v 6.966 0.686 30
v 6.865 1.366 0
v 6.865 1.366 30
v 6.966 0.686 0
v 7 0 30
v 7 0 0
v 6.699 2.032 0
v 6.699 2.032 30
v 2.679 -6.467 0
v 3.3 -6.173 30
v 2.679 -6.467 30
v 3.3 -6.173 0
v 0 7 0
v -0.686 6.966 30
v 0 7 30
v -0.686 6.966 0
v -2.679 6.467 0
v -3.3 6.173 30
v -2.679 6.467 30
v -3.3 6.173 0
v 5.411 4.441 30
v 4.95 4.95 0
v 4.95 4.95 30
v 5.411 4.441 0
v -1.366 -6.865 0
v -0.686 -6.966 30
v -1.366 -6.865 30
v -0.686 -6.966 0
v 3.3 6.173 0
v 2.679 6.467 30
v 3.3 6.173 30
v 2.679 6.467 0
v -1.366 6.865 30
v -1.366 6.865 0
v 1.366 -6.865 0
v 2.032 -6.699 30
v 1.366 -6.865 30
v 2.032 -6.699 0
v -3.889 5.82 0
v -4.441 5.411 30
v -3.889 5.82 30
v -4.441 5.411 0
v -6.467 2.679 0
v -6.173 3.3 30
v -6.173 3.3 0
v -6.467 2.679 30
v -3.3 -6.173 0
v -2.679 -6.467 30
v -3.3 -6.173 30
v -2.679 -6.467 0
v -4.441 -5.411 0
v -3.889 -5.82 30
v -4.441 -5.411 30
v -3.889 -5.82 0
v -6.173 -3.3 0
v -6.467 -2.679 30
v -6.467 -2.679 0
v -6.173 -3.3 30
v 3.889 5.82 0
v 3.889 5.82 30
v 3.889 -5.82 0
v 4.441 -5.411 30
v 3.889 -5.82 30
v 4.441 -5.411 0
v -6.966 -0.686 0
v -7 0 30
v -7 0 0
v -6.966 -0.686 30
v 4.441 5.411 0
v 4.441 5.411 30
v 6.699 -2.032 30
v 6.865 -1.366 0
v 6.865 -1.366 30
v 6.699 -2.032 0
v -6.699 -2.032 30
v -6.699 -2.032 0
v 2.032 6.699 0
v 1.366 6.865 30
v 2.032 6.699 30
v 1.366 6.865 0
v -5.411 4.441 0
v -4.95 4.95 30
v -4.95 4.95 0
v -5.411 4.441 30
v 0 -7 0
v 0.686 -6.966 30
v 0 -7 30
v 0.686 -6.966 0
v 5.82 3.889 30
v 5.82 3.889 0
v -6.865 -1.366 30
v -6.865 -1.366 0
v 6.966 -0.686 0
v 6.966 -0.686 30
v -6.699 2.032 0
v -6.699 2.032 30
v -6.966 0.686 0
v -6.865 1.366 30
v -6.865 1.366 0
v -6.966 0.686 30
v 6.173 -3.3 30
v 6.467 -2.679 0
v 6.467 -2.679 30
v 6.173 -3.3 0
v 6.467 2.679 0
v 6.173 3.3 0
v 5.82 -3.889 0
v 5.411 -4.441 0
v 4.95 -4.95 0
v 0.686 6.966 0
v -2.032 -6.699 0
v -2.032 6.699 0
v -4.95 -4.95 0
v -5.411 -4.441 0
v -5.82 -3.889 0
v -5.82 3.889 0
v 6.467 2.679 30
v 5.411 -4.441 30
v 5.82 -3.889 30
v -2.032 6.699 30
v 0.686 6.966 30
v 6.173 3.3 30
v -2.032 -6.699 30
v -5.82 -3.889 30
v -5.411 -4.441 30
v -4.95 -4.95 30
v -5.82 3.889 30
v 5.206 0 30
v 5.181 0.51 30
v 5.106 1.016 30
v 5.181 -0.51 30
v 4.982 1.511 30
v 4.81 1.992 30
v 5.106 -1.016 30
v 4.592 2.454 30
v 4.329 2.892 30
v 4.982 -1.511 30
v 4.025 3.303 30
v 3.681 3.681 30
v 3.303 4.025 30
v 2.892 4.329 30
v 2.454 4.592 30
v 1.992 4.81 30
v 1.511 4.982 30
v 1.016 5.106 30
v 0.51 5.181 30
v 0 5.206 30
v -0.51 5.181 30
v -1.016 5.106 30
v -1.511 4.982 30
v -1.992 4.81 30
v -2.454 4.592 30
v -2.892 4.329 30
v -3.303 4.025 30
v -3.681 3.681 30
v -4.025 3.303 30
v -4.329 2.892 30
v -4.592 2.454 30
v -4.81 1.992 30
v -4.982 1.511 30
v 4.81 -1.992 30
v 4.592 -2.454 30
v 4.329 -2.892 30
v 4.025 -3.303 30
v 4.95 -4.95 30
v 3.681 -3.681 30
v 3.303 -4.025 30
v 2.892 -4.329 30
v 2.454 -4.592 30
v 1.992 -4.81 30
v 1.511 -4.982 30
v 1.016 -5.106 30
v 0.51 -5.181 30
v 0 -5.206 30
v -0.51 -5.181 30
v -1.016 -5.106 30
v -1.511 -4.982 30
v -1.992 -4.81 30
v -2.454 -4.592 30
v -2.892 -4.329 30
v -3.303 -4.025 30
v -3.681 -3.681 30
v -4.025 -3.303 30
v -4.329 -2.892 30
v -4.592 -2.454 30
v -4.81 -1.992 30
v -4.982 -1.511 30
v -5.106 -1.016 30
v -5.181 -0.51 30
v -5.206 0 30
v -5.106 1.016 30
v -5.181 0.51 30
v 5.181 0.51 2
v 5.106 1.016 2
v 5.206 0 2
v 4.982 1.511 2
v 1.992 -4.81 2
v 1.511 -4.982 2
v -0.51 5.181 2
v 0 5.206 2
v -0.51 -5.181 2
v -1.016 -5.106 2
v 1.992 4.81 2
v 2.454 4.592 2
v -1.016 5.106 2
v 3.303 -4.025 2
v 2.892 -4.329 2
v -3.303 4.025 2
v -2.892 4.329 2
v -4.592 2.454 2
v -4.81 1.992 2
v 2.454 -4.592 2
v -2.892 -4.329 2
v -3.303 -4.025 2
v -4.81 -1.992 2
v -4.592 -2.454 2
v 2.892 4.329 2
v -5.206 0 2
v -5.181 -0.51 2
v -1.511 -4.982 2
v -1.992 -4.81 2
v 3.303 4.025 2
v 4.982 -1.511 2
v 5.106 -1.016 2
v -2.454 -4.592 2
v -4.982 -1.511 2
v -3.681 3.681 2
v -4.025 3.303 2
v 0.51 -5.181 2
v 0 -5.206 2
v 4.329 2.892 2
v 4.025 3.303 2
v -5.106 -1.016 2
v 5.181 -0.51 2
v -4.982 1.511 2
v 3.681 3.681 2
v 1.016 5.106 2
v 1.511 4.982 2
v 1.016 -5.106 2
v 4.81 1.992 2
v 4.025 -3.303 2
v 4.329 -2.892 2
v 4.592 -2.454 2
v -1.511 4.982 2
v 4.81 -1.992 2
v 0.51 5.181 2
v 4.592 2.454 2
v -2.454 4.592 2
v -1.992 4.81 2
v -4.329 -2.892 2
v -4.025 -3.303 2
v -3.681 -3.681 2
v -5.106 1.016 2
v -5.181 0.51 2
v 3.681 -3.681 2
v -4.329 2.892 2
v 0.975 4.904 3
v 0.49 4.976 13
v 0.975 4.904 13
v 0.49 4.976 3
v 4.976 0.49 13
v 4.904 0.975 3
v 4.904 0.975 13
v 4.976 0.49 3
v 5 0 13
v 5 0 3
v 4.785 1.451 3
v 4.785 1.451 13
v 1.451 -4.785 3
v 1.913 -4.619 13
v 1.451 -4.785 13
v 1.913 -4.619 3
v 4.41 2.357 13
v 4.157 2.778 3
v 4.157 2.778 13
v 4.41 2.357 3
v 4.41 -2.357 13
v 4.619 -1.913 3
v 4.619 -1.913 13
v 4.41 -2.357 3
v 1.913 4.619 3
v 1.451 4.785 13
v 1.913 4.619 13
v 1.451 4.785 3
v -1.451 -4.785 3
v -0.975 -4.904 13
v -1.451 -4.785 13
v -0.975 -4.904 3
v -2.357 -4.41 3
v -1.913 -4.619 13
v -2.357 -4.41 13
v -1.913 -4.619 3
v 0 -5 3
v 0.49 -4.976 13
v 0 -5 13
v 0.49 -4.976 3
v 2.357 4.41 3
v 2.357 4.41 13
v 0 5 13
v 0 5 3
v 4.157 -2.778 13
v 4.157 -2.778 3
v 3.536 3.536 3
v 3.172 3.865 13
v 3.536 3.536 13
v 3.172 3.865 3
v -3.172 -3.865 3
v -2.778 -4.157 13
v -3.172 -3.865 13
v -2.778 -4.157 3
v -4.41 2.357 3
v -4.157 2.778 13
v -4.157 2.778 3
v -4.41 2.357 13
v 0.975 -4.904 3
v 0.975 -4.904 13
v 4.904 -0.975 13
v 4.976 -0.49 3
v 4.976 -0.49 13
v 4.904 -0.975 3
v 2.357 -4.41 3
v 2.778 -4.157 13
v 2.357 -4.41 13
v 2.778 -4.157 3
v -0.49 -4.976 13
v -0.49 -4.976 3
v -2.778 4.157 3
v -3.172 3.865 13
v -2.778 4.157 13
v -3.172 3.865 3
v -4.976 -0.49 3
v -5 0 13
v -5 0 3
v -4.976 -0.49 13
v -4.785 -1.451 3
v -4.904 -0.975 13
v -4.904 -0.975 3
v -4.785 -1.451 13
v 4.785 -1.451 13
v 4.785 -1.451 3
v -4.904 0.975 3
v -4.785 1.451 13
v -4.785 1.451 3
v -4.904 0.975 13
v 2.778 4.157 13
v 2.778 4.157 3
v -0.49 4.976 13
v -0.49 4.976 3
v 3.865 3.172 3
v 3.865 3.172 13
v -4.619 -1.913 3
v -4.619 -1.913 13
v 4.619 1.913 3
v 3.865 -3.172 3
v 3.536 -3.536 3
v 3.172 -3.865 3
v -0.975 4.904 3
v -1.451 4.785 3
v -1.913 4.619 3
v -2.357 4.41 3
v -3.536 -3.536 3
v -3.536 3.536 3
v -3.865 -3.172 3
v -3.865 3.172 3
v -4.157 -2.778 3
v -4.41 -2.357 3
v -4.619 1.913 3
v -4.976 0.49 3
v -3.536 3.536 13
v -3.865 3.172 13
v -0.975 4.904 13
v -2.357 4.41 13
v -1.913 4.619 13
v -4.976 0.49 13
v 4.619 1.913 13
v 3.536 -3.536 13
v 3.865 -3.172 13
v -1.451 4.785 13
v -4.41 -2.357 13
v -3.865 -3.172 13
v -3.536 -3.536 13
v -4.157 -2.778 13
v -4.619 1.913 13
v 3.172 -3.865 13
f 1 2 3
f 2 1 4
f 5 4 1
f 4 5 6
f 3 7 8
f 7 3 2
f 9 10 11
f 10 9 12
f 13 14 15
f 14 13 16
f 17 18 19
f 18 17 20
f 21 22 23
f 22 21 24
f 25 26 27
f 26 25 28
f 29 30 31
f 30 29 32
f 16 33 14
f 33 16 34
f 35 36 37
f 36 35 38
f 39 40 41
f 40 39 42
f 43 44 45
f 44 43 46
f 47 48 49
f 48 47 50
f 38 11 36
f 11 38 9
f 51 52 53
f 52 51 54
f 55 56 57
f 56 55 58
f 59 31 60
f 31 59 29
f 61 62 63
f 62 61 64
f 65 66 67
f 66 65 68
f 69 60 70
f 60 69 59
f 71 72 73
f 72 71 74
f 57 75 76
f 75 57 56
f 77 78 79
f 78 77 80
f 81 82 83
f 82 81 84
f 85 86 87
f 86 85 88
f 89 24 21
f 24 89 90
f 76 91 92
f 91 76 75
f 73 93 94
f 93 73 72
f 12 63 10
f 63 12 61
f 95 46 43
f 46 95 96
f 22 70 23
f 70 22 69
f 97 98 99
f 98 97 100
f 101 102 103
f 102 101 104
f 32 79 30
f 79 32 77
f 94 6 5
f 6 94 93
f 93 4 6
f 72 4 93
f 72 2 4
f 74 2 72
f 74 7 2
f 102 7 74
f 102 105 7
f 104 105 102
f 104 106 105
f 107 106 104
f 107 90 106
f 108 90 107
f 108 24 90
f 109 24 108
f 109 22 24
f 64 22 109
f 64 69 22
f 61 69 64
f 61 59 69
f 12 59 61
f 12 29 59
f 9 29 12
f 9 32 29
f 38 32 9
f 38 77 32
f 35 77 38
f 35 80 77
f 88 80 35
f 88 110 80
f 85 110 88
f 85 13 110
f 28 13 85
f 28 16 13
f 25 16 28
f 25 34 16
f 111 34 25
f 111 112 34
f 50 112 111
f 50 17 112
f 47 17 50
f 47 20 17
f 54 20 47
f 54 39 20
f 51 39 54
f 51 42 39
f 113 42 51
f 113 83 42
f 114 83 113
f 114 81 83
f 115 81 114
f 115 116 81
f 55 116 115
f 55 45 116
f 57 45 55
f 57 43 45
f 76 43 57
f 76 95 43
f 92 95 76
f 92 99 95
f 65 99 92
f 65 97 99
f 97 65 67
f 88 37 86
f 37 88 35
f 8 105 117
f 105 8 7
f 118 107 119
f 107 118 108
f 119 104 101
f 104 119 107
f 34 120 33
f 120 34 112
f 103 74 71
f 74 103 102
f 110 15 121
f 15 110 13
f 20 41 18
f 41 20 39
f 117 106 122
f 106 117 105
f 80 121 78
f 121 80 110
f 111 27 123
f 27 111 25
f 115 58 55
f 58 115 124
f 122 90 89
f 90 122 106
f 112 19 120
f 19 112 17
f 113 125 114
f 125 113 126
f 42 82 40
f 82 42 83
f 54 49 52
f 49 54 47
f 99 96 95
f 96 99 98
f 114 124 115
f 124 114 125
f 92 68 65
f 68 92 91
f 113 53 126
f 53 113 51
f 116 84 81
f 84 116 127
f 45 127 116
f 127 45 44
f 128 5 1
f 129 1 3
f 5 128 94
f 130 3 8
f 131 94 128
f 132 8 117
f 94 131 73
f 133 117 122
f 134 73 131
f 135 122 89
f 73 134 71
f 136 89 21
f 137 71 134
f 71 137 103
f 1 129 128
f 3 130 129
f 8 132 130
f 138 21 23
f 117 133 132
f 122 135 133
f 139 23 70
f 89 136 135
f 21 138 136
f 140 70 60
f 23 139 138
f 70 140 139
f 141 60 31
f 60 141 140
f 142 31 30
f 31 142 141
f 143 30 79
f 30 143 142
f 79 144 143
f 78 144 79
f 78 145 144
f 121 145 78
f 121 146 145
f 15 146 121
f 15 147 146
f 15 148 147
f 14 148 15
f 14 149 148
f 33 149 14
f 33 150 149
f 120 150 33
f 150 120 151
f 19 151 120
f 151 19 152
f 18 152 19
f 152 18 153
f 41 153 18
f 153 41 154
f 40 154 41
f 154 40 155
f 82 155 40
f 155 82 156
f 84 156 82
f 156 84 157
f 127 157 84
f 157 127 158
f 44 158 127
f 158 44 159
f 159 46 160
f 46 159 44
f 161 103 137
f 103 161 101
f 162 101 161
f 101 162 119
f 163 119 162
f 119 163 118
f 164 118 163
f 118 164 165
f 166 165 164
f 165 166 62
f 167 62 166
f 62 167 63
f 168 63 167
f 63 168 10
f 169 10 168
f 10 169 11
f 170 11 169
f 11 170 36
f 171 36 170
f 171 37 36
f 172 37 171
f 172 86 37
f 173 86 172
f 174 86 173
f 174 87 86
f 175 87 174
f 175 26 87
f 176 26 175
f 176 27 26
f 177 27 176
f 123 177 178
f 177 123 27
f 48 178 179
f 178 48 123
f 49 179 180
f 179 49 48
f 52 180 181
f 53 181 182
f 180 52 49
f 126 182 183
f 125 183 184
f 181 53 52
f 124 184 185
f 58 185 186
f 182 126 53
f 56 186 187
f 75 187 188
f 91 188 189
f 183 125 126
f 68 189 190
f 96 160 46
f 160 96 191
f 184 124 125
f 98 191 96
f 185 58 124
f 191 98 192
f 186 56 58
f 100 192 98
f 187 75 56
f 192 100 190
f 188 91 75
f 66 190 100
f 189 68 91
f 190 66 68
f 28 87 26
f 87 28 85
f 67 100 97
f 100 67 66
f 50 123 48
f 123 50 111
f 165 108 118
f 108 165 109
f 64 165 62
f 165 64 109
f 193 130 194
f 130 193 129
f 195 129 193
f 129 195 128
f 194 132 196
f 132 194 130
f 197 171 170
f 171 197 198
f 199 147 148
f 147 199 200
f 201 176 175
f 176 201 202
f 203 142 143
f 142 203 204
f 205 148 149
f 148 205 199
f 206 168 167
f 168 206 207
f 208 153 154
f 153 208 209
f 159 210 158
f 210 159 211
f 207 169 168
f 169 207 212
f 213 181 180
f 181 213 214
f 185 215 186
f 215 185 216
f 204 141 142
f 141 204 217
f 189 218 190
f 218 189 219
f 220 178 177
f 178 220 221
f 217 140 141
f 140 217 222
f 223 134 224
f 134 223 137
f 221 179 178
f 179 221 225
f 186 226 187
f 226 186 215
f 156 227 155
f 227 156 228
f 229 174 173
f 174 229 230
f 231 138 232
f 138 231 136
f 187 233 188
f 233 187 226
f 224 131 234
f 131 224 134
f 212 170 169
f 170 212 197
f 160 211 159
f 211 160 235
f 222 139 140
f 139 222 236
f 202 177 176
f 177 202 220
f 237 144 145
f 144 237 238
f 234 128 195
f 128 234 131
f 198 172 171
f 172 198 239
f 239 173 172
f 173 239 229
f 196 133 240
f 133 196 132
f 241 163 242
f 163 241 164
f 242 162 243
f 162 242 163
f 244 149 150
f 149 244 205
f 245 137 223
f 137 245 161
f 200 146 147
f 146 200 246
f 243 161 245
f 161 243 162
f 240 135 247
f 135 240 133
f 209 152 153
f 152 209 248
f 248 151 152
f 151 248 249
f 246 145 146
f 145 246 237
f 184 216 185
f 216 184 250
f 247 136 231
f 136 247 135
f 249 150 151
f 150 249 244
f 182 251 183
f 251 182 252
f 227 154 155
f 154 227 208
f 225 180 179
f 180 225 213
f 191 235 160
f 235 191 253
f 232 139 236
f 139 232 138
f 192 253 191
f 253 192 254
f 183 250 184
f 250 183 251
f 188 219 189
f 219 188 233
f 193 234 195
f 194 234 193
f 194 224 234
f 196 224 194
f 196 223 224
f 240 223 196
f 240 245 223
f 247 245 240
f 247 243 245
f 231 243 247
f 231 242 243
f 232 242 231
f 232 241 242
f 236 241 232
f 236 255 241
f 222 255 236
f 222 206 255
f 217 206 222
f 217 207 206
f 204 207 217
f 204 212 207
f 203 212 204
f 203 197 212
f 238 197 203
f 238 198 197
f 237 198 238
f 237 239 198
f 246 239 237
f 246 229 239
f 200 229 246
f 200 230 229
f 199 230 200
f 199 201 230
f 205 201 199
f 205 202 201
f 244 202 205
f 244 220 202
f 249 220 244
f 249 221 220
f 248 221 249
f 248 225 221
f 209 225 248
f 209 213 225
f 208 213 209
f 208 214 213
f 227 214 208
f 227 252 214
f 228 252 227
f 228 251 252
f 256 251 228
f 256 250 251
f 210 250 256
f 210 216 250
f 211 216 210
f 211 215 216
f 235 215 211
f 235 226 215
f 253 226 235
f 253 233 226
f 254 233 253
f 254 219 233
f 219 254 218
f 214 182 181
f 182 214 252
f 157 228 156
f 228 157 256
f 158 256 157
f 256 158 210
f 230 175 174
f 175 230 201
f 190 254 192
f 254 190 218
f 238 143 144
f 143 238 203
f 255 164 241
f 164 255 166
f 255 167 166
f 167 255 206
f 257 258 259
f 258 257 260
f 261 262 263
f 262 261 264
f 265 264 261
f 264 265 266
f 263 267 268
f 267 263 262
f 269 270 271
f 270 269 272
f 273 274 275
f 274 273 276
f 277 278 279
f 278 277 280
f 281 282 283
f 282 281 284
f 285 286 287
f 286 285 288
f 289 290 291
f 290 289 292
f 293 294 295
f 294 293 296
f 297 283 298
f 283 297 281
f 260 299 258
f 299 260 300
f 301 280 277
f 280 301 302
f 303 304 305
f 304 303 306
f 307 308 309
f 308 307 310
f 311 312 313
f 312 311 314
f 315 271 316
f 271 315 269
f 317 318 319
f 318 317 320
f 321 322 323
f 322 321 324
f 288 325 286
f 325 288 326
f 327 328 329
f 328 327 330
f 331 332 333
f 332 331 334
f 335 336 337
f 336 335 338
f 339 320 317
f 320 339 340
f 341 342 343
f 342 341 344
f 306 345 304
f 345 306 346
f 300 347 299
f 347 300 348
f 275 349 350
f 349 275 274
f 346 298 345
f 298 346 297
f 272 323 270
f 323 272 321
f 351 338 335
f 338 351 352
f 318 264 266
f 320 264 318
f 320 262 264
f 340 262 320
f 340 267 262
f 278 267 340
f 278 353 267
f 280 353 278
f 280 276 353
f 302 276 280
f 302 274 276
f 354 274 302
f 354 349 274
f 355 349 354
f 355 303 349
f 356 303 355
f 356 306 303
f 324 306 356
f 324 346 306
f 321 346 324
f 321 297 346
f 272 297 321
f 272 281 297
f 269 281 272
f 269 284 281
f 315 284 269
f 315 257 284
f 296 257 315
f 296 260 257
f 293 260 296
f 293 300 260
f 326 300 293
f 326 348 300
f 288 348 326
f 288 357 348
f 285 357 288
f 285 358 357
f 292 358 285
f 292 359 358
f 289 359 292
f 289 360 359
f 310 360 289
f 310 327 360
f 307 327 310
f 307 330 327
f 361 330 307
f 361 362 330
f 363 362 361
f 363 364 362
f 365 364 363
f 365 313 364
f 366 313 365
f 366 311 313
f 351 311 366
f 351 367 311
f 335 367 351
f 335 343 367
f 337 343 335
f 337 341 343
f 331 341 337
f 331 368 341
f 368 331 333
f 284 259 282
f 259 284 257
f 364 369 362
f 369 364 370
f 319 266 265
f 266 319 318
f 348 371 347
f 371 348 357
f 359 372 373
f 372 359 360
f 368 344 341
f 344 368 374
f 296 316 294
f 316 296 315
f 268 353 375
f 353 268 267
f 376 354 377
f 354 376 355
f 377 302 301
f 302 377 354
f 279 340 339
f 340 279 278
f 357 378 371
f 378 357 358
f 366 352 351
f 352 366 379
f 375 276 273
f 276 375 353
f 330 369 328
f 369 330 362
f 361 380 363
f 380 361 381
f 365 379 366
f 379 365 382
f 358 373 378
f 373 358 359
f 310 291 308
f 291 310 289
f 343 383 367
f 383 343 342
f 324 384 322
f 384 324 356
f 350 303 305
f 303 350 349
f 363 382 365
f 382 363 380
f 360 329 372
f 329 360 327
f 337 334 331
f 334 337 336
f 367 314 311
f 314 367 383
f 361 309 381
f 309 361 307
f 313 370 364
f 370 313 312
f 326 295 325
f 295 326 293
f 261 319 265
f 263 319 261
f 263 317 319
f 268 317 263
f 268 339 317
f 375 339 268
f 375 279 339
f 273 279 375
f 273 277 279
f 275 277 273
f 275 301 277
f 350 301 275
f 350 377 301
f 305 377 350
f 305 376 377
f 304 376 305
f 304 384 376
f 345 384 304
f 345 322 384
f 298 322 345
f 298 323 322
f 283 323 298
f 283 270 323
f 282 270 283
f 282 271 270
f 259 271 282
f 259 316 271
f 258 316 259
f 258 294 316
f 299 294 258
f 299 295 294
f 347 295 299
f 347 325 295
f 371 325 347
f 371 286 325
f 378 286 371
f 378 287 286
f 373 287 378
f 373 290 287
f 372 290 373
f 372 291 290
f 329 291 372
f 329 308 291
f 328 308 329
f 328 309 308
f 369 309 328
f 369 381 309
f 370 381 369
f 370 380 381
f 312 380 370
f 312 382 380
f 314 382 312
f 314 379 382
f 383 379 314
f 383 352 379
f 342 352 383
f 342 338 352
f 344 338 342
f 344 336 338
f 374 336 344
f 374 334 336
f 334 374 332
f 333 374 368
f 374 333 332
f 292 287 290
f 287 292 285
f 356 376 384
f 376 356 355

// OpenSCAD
// Reference submission for piston-bore-30.
//
// A piston in a blind cup. Unlike the hinge, the bore part is the stationary
// one: the barrel holds the bore and the piston is the moving shaft.
//
//   barrel: outer d 14, height 30, blind bore d 10.40 starting 2 mm up.
//   piston: d 10, 10 mm long, sitting 1 mm above the bore floor.
//
// The bore cylinder is scaled so its inscribed diameter is exactly 10.40 mm,
// which puts the as-designed diametral clearance at 0.40 mm against a 10 mm
// piston.
// Units: mm. Axis: +Z through the origin.
agentscad_part = "all";
piston_stroke = 0;   // pose control: the benchmark re-renders the piston at this stroke
$fn = 64;

bore_d = 10.40 / cos(180 / $fn);

module barrel() {
  difference() {
    translate([0, 0, 0]) cylinder(h = 30, d = 14);
    translate([0, 0, 2]) cylinder(h = 29, d = bore_d);
  }
}

module piston() {
  translate([0, 0, 3 + piston_stroke]) cylinder(h = 10, d = 10);
}

module generated_part() {
  if (agentscad_part == "all" || agentscad_part == "barrel") barrel();
  if (agentscad_part == "all" || agentscad_part == "piston") piston();
}

generated_part();
